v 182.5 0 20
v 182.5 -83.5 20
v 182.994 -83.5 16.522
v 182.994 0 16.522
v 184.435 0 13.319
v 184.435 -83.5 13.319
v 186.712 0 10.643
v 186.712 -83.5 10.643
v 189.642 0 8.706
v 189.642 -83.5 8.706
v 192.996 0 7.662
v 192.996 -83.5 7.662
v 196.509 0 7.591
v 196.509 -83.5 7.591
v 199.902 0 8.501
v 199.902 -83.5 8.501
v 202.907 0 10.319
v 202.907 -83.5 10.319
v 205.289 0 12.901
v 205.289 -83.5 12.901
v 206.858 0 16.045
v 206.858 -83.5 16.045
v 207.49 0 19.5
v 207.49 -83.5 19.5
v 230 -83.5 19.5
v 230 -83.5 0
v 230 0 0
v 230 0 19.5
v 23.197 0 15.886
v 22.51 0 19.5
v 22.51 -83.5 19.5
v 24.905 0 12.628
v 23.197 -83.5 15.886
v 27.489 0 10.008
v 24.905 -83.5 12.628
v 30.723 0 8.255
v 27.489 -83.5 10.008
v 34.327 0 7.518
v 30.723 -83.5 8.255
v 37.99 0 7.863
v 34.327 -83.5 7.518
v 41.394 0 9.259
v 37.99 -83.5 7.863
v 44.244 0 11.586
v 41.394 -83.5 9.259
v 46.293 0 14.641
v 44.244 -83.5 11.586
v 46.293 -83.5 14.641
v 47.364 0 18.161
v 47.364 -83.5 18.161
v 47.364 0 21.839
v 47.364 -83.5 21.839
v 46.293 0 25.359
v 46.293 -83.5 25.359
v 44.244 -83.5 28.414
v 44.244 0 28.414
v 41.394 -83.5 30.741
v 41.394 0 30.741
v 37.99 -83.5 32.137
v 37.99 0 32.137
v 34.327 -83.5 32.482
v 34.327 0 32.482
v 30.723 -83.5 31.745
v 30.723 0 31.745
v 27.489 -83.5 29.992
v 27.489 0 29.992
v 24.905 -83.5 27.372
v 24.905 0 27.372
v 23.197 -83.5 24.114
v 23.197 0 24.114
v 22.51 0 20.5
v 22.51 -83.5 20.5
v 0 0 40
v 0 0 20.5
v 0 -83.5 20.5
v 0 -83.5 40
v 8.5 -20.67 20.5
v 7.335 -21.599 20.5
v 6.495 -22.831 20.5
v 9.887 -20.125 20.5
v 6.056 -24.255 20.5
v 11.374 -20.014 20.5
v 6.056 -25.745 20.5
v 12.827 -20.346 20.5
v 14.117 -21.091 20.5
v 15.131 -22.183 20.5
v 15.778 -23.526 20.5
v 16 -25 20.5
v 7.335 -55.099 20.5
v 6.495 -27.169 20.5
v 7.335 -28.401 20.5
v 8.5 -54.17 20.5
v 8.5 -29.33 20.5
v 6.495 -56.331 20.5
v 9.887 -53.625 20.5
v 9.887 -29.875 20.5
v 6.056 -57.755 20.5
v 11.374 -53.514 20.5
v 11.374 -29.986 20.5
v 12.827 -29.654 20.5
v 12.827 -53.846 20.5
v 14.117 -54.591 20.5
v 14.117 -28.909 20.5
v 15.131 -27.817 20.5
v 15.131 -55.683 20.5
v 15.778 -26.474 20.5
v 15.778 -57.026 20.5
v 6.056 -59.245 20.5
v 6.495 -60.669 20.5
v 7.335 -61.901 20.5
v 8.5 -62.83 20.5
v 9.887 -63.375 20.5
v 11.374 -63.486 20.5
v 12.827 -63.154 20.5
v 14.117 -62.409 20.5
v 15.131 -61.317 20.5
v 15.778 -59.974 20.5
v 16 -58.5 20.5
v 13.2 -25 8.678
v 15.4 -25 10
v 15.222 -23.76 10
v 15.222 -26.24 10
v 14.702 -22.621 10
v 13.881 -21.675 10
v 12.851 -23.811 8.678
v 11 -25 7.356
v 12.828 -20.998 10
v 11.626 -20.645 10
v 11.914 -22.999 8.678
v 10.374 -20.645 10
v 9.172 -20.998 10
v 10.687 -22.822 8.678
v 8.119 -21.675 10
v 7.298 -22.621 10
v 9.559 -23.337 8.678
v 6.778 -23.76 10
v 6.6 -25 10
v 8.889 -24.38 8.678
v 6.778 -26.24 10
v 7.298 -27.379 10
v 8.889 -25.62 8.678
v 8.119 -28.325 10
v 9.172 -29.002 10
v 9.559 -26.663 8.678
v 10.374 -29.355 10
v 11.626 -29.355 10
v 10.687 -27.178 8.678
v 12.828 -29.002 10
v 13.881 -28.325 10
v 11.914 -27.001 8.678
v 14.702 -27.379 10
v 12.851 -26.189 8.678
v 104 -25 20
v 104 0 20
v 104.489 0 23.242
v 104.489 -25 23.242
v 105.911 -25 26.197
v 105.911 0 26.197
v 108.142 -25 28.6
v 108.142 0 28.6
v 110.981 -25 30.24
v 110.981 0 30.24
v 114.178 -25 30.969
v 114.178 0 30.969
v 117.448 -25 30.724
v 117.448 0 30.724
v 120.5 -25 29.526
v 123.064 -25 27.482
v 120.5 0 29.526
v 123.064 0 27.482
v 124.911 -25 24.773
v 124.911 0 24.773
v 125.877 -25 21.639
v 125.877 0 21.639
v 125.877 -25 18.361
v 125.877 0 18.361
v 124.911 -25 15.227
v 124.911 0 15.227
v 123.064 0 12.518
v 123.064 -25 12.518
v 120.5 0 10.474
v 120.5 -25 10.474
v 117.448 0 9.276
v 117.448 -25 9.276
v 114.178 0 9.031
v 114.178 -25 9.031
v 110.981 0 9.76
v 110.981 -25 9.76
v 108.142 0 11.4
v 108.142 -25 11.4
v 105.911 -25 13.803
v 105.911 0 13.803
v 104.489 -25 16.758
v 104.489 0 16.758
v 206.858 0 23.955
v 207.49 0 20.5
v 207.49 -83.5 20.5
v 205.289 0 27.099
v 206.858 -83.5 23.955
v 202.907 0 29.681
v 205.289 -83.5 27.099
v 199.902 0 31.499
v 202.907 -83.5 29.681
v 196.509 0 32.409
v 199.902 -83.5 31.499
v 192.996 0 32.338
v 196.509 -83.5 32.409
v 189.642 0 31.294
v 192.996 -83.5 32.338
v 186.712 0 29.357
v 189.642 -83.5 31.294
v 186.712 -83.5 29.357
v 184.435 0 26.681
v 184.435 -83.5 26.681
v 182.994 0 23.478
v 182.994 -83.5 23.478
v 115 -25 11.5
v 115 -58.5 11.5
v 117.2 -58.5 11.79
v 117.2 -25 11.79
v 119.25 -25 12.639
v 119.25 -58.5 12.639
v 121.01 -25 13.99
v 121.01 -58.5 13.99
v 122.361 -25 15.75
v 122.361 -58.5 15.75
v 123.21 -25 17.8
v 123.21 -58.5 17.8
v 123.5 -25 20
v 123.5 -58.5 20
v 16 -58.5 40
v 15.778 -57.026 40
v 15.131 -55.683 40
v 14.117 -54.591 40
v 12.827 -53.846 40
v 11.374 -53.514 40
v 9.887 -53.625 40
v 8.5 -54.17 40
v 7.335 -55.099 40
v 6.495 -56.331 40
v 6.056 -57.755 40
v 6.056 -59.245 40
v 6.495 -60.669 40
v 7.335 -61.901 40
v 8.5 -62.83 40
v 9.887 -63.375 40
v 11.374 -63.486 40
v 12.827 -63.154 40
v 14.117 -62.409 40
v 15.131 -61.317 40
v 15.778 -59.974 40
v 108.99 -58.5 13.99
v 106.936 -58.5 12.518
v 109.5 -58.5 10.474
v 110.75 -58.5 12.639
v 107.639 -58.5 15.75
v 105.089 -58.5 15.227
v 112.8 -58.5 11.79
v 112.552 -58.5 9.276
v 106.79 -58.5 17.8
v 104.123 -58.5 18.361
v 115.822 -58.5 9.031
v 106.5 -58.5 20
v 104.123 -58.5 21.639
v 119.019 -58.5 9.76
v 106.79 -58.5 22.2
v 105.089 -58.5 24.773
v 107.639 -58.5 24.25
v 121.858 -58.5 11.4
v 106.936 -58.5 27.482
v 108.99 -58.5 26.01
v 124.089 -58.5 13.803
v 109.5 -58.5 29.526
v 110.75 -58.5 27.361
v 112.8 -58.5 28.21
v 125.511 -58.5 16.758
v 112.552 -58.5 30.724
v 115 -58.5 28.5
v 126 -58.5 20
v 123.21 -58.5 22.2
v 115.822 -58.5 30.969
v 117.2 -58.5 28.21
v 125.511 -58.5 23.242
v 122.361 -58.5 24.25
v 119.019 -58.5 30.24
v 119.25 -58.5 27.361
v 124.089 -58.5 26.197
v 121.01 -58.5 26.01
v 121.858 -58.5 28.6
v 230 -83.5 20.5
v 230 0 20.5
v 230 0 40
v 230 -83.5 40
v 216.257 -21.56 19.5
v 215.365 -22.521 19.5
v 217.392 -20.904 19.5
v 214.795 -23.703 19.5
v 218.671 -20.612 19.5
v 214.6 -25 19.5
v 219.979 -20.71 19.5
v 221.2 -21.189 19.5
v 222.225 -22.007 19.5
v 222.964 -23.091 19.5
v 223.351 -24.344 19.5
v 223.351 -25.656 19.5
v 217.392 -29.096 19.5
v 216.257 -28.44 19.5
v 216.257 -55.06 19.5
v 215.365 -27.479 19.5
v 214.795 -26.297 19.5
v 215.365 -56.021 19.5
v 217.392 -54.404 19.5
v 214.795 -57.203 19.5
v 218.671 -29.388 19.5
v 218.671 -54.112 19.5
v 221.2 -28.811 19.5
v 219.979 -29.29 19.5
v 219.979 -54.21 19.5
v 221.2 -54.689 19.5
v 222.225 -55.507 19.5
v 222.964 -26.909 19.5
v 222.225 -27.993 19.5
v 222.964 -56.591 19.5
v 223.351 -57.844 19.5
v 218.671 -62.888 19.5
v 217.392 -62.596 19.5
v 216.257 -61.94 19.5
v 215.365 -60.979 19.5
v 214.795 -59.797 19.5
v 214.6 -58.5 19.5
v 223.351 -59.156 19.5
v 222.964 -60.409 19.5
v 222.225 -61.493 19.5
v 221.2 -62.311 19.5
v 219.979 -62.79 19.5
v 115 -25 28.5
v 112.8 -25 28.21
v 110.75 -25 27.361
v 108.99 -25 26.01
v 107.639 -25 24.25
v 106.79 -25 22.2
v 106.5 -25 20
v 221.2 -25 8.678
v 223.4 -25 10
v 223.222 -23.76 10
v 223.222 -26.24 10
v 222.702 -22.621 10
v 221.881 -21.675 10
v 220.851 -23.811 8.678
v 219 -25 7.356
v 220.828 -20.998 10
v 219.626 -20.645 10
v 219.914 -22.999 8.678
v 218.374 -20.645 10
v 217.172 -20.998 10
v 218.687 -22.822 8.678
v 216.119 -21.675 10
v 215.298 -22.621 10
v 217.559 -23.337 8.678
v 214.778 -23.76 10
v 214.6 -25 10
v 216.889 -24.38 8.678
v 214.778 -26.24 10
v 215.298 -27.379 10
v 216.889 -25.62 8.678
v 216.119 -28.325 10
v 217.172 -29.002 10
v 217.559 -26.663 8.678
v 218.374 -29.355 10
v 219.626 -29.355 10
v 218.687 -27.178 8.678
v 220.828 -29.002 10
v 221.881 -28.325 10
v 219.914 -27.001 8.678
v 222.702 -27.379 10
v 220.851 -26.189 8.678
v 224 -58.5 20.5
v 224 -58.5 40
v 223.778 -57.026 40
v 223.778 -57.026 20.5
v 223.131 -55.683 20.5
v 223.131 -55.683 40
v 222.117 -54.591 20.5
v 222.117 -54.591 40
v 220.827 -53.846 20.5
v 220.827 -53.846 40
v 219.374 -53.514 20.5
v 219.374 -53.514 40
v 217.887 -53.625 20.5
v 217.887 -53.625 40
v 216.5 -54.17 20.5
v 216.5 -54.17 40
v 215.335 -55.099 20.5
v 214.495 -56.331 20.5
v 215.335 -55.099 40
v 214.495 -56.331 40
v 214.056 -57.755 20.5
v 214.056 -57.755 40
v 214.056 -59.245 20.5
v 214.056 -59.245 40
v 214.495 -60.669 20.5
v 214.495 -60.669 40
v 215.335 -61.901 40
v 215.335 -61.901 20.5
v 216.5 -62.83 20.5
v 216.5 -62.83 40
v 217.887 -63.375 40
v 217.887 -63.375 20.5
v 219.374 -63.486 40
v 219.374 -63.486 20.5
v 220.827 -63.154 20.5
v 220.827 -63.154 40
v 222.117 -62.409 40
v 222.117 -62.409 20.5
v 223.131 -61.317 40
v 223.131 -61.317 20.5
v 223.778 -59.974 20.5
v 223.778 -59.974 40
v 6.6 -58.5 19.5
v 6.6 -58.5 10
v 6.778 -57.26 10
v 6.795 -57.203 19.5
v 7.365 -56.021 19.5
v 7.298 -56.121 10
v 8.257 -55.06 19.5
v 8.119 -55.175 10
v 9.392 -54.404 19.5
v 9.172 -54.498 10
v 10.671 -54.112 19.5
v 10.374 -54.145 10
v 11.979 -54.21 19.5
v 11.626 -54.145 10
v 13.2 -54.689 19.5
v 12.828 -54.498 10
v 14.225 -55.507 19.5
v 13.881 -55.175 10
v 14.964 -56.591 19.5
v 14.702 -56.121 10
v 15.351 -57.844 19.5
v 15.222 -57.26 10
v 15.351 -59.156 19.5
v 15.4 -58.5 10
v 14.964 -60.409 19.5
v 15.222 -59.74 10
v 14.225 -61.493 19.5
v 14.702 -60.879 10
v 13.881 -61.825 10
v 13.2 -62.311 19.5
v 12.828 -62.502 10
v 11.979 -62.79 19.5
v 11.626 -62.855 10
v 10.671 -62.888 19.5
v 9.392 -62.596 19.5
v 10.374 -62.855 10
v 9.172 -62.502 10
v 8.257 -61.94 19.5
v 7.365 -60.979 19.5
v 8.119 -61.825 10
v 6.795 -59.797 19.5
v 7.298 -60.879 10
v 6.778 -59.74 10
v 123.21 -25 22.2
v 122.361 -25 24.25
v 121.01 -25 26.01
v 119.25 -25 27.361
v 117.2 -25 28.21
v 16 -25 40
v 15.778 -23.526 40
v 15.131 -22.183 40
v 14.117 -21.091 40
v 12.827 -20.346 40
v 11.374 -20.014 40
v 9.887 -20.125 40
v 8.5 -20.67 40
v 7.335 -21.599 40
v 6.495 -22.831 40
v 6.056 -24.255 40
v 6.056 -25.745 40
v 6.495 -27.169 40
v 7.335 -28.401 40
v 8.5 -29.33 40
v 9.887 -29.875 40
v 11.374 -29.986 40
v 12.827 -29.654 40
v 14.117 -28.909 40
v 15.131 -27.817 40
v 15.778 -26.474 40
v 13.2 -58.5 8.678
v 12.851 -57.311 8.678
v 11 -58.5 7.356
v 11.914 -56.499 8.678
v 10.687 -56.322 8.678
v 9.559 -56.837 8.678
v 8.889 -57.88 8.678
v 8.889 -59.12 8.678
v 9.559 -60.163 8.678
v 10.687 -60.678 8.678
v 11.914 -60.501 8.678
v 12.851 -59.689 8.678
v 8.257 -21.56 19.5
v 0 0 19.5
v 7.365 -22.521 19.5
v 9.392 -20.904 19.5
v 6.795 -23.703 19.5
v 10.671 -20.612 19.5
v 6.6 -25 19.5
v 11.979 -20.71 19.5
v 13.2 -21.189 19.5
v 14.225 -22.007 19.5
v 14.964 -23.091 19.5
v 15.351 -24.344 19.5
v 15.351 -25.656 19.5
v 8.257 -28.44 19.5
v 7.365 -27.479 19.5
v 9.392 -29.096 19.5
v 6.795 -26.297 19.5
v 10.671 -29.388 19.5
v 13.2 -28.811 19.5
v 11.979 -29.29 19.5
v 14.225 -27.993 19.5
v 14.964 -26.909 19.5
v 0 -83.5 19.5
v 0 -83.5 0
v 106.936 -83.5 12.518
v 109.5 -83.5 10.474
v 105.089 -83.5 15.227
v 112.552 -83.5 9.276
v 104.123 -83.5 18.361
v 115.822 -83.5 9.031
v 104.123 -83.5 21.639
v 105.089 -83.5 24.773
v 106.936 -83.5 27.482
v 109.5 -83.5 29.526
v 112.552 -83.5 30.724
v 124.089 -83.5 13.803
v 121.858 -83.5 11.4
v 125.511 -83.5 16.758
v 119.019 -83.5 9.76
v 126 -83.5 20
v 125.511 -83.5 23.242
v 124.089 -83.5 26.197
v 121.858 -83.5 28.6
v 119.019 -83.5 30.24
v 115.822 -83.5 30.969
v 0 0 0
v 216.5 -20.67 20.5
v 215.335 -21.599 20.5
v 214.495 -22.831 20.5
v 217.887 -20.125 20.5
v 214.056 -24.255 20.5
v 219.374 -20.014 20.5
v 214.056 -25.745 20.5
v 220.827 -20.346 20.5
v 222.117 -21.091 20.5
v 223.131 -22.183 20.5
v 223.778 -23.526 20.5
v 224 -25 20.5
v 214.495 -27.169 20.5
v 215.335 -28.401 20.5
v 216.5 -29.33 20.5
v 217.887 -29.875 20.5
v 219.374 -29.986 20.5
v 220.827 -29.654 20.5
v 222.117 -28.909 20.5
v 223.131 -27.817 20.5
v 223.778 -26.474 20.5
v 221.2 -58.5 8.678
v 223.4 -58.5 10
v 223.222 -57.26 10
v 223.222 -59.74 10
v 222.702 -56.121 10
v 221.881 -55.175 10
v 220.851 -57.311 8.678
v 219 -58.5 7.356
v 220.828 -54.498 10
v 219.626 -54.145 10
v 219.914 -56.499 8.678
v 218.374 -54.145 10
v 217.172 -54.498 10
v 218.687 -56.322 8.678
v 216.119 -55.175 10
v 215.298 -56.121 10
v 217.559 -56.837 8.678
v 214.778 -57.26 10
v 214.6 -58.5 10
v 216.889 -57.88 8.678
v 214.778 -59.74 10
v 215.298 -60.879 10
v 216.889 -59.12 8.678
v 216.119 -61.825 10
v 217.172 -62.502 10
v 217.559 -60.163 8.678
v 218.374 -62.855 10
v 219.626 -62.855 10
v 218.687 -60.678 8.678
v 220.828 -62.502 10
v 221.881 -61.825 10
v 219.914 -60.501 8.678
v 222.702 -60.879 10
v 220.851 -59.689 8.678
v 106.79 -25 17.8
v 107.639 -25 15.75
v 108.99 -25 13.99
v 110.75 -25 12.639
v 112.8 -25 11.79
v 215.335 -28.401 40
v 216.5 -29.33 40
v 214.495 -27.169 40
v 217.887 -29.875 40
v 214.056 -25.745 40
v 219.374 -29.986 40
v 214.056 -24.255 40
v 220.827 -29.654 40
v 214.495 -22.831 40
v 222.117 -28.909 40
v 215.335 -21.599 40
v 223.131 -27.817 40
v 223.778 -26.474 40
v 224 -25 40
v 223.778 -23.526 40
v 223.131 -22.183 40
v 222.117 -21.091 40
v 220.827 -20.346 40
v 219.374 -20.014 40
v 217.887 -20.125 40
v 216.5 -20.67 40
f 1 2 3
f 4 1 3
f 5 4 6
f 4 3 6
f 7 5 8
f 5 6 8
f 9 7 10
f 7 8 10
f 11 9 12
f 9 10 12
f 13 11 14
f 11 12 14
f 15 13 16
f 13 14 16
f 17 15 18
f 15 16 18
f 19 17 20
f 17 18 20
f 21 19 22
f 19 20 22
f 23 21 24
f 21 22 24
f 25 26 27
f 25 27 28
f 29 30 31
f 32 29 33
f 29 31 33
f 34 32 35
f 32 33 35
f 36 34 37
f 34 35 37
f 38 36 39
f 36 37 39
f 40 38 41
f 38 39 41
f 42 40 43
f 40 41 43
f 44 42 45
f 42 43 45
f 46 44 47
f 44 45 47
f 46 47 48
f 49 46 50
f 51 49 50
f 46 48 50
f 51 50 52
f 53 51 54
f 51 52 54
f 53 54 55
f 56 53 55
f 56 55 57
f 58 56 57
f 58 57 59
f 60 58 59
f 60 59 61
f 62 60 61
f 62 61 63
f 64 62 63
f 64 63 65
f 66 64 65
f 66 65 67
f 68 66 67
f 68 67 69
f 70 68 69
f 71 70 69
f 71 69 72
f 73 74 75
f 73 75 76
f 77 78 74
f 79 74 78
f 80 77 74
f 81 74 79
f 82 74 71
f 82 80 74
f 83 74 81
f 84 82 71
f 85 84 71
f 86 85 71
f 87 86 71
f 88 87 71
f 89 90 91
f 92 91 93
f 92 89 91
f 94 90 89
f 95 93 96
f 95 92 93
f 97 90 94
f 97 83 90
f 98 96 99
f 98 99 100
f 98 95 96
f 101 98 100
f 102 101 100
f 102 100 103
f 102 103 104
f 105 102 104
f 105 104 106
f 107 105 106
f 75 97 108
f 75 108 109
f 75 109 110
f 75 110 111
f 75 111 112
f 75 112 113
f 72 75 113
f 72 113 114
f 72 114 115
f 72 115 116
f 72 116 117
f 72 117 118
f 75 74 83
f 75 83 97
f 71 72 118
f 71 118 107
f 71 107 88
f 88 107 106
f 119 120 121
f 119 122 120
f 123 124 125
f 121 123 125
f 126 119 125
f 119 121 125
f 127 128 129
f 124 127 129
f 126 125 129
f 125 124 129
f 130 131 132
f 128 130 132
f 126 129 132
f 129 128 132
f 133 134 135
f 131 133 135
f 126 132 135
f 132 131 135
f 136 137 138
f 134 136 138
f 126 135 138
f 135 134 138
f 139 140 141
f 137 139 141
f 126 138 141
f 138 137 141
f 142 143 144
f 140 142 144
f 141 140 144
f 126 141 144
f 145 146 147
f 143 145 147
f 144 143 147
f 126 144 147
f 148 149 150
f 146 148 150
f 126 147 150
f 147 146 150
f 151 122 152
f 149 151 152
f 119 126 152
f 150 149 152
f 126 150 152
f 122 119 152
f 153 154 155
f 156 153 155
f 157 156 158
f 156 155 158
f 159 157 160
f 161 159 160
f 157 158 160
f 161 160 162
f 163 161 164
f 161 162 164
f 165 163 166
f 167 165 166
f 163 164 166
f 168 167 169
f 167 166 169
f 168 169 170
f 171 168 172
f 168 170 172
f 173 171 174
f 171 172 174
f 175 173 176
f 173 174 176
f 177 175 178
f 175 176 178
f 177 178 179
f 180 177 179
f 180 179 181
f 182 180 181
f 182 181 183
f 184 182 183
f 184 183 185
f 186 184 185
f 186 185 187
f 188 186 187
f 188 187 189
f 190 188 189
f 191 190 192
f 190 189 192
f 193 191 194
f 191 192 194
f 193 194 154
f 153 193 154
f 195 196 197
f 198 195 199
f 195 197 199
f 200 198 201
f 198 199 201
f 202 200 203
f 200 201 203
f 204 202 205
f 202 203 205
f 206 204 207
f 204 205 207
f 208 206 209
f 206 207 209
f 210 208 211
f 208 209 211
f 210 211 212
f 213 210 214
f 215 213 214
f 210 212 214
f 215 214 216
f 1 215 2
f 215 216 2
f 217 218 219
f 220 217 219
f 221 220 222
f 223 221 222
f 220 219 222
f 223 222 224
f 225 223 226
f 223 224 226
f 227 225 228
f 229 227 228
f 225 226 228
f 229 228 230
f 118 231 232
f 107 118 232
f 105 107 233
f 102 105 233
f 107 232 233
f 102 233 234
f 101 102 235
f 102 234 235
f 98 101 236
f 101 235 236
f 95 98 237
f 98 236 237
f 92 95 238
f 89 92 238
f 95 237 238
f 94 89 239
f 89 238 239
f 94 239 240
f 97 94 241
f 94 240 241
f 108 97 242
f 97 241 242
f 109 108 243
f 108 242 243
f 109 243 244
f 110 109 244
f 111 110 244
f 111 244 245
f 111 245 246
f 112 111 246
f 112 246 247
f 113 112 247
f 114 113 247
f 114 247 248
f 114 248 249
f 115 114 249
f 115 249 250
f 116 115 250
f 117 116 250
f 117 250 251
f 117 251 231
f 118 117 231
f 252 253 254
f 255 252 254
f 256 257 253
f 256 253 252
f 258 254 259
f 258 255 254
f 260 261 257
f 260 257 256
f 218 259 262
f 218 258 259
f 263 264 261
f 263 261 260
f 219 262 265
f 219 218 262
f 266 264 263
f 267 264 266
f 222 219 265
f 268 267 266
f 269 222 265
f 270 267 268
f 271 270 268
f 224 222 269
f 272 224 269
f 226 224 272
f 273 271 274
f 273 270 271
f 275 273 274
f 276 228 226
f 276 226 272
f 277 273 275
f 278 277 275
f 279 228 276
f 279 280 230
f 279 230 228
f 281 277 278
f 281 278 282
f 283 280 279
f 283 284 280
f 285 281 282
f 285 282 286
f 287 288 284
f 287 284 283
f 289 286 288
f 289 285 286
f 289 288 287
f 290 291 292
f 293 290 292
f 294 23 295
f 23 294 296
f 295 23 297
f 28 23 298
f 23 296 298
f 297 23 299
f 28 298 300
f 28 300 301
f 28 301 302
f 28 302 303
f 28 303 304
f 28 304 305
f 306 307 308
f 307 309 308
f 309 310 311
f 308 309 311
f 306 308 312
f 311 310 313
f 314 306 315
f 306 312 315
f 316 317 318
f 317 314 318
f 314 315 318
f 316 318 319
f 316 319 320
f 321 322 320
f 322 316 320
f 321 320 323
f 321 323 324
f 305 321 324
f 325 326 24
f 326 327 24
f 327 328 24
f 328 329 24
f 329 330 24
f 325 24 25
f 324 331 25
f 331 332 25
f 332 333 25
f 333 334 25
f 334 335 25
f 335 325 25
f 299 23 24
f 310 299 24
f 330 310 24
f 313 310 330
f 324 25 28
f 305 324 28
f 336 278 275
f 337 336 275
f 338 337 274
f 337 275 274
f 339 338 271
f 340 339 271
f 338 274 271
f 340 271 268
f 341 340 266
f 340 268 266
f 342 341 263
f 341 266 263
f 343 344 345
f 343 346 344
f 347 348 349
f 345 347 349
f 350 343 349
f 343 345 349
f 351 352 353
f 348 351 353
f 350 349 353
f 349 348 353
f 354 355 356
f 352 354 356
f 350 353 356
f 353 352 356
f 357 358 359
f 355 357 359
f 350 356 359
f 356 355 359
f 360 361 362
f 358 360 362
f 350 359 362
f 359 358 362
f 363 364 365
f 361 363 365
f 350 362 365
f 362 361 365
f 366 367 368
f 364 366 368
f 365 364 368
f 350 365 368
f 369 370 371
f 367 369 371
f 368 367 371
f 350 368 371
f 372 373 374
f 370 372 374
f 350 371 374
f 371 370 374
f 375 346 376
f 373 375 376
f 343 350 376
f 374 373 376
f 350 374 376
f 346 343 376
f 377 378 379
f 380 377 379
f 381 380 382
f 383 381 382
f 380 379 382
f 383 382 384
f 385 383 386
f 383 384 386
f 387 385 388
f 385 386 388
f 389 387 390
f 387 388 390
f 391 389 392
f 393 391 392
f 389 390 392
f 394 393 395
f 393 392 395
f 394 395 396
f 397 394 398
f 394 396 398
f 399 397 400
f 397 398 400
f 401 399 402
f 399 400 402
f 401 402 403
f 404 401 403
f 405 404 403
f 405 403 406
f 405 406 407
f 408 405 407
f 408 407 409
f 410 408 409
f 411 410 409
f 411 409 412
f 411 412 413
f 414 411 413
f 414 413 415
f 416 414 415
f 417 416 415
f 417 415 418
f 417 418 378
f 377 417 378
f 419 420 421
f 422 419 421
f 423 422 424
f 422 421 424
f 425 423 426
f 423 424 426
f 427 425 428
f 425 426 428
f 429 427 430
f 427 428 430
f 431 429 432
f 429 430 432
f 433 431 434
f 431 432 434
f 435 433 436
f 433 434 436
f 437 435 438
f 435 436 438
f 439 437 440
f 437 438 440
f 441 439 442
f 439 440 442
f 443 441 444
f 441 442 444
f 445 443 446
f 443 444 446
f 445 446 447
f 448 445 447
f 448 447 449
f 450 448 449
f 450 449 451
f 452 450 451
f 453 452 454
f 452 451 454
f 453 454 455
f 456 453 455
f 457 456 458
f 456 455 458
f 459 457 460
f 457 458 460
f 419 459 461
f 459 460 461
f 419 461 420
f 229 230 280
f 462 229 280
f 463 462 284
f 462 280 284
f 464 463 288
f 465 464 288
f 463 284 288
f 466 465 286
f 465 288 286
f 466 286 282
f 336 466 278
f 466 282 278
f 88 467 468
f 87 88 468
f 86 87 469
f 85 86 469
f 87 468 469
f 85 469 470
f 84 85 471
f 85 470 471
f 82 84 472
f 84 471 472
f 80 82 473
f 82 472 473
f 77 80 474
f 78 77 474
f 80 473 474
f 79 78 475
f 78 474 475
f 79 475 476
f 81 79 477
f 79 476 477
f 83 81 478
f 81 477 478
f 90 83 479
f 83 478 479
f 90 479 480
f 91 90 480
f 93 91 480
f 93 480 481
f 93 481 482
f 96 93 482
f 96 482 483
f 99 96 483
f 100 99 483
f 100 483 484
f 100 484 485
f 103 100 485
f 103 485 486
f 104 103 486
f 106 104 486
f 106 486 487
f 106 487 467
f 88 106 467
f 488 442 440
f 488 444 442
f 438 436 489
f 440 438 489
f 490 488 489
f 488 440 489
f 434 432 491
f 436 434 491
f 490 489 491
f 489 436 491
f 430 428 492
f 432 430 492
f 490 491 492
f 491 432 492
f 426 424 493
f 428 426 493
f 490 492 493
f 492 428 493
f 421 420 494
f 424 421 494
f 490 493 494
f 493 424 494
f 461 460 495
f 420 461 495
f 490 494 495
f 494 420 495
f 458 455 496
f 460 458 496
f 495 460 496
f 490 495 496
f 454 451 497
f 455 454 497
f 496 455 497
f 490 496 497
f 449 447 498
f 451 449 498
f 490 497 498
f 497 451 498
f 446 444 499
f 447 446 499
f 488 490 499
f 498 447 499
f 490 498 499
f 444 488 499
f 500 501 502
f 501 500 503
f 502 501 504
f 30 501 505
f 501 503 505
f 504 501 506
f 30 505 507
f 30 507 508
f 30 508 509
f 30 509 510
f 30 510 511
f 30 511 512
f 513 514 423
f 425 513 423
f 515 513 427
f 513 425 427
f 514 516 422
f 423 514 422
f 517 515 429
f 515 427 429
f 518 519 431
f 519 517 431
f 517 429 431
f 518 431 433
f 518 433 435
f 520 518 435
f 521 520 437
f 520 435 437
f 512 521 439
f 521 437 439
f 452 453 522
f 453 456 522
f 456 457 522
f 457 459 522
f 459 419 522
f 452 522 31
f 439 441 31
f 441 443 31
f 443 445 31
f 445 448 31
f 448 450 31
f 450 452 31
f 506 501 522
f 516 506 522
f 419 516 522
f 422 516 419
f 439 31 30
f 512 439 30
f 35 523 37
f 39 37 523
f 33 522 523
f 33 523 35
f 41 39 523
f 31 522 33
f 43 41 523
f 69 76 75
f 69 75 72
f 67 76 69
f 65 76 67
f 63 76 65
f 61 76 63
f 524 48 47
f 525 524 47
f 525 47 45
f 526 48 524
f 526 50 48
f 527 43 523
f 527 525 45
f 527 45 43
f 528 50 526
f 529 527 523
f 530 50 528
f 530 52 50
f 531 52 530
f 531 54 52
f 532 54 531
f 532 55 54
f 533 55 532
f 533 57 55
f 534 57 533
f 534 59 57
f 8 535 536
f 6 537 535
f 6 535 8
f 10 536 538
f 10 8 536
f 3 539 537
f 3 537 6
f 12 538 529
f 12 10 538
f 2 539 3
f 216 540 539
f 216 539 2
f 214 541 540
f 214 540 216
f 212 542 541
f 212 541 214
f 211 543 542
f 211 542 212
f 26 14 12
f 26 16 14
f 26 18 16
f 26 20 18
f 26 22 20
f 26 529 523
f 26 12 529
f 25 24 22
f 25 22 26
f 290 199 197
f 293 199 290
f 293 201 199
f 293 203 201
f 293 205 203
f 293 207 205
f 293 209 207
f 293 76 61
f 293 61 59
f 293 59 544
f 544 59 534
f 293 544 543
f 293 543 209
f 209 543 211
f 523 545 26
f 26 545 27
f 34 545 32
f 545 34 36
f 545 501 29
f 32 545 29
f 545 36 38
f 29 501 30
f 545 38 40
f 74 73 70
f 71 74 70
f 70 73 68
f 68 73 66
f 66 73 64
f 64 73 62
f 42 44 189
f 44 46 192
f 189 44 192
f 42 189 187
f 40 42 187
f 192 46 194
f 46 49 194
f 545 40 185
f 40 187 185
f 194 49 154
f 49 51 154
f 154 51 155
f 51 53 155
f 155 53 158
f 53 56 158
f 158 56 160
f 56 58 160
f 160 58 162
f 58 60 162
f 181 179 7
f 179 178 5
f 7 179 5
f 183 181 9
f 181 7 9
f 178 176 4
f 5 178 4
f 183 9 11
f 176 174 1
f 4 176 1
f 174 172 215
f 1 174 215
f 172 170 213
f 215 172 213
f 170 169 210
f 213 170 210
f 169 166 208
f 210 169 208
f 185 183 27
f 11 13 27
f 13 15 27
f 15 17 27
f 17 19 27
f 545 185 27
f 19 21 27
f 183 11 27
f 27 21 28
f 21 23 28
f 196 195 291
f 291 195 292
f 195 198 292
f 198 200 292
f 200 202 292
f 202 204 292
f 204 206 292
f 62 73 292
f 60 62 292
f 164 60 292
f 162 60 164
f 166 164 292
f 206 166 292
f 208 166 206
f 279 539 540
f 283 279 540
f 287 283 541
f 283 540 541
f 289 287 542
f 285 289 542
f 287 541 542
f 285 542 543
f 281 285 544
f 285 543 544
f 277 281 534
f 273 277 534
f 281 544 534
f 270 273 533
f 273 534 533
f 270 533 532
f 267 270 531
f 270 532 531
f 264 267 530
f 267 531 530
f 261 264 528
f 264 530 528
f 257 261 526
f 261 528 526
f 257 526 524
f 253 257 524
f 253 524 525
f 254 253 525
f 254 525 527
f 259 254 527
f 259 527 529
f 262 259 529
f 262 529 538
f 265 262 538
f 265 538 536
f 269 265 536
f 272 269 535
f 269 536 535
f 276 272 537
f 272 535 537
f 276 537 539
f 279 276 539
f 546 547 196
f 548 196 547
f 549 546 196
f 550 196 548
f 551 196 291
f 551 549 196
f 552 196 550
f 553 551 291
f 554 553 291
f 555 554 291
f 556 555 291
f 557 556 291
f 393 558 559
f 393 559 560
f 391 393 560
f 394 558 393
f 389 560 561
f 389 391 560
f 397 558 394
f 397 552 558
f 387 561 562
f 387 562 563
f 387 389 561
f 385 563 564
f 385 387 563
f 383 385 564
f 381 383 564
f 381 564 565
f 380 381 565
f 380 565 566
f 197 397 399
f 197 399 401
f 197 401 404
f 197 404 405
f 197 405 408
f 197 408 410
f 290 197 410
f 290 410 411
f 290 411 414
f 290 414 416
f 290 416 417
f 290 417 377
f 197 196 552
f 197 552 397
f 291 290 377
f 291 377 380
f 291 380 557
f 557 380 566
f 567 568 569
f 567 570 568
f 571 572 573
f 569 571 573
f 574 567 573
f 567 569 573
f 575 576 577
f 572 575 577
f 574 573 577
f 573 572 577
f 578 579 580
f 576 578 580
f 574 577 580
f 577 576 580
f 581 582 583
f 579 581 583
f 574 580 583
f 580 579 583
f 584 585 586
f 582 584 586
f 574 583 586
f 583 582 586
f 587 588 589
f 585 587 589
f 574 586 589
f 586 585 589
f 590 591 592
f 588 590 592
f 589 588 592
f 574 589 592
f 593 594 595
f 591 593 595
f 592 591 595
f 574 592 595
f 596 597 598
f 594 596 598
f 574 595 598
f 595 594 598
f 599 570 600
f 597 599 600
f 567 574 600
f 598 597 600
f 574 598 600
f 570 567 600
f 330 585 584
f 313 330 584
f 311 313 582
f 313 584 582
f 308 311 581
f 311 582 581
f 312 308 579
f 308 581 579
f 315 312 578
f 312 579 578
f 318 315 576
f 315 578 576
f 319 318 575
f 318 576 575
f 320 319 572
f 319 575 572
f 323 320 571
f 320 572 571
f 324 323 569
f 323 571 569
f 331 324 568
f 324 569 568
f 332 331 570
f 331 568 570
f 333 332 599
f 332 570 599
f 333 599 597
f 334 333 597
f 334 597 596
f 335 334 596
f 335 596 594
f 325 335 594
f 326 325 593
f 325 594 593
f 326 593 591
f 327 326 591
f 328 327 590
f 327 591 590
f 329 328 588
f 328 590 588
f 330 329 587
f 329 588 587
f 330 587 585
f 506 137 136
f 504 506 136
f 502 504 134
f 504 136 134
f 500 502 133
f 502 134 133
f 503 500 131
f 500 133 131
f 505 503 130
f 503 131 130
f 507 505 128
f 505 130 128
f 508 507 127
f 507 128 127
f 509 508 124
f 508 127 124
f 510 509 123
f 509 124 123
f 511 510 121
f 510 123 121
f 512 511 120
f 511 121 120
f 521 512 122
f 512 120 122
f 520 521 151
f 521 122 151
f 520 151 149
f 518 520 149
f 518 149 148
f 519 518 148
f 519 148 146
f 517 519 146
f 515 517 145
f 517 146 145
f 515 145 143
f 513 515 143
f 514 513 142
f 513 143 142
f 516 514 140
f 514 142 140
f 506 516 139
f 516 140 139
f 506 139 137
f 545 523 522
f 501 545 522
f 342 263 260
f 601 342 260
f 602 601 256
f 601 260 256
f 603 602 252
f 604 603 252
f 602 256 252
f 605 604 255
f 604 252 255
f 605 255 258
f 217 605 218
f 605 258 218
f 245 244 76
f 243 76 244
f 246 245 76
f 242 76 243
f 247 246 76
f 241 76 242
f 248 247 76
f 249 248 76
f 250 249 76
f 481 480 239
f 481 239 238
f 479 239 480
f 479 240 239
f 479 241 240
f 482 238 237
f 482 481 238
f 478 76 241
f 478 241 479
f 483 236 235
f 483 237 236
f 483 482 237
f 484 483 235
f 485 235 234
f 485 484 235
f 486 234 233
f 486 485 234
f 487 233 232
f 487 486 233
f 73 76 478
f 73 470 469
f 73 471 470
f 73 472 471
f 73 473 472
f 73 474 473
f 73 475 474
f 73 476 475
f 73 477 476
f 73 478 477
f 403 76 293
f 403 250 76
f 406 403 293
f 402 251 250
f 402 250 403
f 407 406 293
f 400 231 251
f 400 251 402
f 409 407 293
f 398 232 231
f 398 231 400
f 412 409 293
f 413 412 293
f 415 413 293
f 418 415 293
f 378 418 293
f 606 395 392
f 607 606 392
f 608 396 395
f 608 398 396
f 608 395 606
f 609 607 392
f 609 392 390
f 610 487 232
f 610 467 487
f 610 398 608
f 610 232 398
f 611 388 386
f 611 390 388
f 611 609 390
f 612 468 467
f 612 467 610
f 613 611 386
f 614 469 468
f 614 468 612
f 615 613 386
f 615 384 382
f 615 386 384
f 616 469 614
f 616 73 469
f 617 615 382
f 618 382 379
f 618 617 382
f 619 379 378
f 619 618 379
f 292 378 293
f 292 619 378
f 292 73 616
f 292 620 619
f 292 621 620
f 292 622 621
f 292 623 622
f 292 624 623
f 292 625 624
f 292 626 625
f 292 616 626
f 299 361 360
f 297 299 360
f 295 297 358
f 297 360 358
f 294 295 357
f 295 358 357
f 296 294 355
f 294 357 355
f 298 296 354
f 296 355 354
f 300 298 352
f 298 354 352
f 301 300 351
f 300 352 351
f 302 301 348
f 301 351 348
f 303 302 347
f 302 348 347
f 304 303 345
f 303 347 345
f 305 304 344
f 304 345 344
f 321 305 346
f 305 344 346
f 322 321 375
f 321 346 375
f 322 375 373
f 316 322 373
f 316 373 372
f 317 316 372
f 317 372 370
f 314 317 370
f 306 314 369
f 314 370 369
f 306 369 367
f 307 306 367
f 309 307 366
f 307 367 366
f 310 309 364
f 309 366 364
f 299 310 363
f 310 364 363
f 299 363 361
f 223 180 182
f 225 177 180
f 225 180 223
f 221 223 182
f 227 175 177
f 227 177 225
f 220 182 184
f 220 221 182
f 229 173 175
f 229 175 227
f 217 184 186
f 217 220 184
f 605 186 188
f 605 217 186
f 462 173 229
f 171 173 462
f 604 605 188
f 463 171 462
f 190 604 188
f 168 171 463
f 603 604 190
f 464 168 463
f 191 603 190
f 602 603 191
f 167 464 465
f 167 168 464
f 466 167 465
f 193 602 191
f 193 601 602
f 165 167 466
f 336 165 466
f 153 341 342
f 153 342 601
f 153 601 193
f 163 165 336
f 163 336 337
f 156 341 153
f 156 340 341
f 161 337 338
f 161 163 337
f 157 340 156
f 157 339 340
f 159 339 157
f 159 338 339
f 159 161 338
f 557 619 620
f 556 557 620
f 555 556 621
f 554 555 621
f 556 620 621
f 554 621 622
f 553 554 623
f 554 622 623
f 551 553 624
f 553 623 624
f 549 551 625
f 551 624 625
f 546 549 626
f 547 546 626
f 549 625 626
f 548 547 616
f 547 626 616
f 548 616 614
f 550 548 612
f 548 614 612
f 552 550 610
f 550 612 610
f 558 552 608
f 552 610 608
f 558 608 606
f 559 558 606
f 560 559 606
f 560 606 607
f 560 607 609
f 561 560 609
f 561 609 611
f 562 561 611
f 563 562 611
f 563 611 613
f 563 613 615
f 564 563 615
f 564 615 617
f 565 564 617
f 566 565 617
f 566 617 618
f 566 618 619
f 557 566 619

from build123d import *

# Parameters (mm, degrees)
F0_W            = 230
F0_H            = 40
F1_DEPTH        = 83.5
F3_DEPTH        = 83.501
F4_R            = 11
F5_DEPTH        = 25
F6_R            = 11
F7_DEPTH        = 25
F8_W            = 26.2972414494
F8_H            = 0.5
F8_W_2          = 31.4752864838
F9_DEPTH        = 83.501
F11_D           = 8.8
F11_DEPTH       = 30
F11_CBORE_D     = 10
F11_CBORE_DEPTH = 20
F11_TIP         = 2.6437867237


with BuildPart() as f1:
    # F0 (on Front) → F1 (new body)
    with BuildSketch(Plane.XZ):
        with Locations((115, 20)):
            Rectangle(F0_W, F0_H)
    extrude(amount=F1_DEPTH)

    # F2 (on face) → F3 (cut, through all)
    with BuildSketch(Plane.XZ.offset(83.5)):
        with BuildLine():
            Line((22.5, 20), (35, 20))
            Line((35, 20), (47.5, 20))
            ThreePointArc((47.5, 20), (35, 32.5), (22.5, 20))
        make_face()
        with BuildLine():
            Line((47.5, 20), (35, 20))
            Line((35, 20), (22.5, 20))
            ThreePointArc((22.5, 20), (35, 7.5), (47.5, 20))
        make_face()
        with BuildLine():
            ThreePointArc((207.5, 20), (195, 32.5), (182.5, 20))
            Line((182.5, 20), (195, 20))
            Line((195, 20), (207.5, 20))
        make_face()
        with BuildLine():
            Line((195, 20), (182.5, 20))
            ThreePointArc((182.5, 20), (195, 7.5), (207.5, 20))
            Line((207.5, 20), (195, 20))
        make_face()
        with BuildLine():
            ThreePointArc((115, 28.5), (108.9895923599, 26.0104076401), (106.5, 20))
            Line((106.5, 20), (115, 20))
            Line((115, 20), (115, 28.5))
        make_face()
        with BuildLine():
            Line((115, 20), (106.5, 20))
            ThreePointArc((106.5, 20), (108.9895923599, 13.9895923599), (115, 11.5))
            Line((115, 11.5), (115, 20))
        make_face()
        with BuildLine():
            Line((115, 28.5), (115, 20))
            Line((115, 20), (123.5, 20))
            ThreePointArc((123.5, 20), (121.0104076401, 26.0104076401), (115, 28.5))
        make_face()
        with BuildLine():
            Line((123.5, 20), (115, 20))
            Line((115, 20), (115, 11.5))
            ThreePointArc((115, 11.5), (121.0104076401, 13.9895923599), (123.5, 20))
        make_face()
    extrude(amount=-F3_DEPTH, mode=Mode.SUBTRACT)

    # F4 (on face) → F5 (cut)
    with BuildSketch(Plane.XZ.offset(83.5)):
        with Locations((115, 20)):
            Circle(F4_R)
    extrude(amount=-F5_DEPTH, mode=Mode.SUBTRACT)

    # F6 (on face) → F7 (cut)
    with BuildSketch(Plane(origin=(0, 0, 0), x_dir=(-1, 0, 0), z_dir=(0, 1, 0))):
        with Locations((-115, 20)):
            Circle(F6_R)
    extrude(amount=-F7_DEPTH, mode=Mode.SUBTRACT)

    # F8 (on face) → F9 (cut, through all)
    with BuildSketch(Plane.XZ.offset(83.5)):
        with Locations((13.1486207247, 20.25)):
            Rectangle(F8_W, F8_H)
        with Locations((13.1486207247, 19.75)):
            Rectangle(F8_W, F8_H)
        with Locations((214.2623567581, 19.75)):
            Rectangle(F8_W_2, F8_H)
        with Locations((214.2623567581, 20.25)):
            Rectangle(F8_W_2, F8_H)
    extrude(amount=-F9_DEPTH, mode=Mode.SUBTRACT)

    # F11
    with Locations(Plane.XY.offset(40)):
        with Locations((11, -25), (11, -58.5), (219, -25), (219, -58.5)):
            CounterBoreHole(F11_D / 2, F11_CBORE_D / 2, F11_CBORE_DEPTH, depth=F11_DEPTH)
            with Locations((0, 0, -(F11_DEPTH + F11_TIP / 2))):  # 118° drill point
                Cone(0, F11_D / 2, F11_TIP, mode=Mode.SUBTRACT)


solid = f1.part
